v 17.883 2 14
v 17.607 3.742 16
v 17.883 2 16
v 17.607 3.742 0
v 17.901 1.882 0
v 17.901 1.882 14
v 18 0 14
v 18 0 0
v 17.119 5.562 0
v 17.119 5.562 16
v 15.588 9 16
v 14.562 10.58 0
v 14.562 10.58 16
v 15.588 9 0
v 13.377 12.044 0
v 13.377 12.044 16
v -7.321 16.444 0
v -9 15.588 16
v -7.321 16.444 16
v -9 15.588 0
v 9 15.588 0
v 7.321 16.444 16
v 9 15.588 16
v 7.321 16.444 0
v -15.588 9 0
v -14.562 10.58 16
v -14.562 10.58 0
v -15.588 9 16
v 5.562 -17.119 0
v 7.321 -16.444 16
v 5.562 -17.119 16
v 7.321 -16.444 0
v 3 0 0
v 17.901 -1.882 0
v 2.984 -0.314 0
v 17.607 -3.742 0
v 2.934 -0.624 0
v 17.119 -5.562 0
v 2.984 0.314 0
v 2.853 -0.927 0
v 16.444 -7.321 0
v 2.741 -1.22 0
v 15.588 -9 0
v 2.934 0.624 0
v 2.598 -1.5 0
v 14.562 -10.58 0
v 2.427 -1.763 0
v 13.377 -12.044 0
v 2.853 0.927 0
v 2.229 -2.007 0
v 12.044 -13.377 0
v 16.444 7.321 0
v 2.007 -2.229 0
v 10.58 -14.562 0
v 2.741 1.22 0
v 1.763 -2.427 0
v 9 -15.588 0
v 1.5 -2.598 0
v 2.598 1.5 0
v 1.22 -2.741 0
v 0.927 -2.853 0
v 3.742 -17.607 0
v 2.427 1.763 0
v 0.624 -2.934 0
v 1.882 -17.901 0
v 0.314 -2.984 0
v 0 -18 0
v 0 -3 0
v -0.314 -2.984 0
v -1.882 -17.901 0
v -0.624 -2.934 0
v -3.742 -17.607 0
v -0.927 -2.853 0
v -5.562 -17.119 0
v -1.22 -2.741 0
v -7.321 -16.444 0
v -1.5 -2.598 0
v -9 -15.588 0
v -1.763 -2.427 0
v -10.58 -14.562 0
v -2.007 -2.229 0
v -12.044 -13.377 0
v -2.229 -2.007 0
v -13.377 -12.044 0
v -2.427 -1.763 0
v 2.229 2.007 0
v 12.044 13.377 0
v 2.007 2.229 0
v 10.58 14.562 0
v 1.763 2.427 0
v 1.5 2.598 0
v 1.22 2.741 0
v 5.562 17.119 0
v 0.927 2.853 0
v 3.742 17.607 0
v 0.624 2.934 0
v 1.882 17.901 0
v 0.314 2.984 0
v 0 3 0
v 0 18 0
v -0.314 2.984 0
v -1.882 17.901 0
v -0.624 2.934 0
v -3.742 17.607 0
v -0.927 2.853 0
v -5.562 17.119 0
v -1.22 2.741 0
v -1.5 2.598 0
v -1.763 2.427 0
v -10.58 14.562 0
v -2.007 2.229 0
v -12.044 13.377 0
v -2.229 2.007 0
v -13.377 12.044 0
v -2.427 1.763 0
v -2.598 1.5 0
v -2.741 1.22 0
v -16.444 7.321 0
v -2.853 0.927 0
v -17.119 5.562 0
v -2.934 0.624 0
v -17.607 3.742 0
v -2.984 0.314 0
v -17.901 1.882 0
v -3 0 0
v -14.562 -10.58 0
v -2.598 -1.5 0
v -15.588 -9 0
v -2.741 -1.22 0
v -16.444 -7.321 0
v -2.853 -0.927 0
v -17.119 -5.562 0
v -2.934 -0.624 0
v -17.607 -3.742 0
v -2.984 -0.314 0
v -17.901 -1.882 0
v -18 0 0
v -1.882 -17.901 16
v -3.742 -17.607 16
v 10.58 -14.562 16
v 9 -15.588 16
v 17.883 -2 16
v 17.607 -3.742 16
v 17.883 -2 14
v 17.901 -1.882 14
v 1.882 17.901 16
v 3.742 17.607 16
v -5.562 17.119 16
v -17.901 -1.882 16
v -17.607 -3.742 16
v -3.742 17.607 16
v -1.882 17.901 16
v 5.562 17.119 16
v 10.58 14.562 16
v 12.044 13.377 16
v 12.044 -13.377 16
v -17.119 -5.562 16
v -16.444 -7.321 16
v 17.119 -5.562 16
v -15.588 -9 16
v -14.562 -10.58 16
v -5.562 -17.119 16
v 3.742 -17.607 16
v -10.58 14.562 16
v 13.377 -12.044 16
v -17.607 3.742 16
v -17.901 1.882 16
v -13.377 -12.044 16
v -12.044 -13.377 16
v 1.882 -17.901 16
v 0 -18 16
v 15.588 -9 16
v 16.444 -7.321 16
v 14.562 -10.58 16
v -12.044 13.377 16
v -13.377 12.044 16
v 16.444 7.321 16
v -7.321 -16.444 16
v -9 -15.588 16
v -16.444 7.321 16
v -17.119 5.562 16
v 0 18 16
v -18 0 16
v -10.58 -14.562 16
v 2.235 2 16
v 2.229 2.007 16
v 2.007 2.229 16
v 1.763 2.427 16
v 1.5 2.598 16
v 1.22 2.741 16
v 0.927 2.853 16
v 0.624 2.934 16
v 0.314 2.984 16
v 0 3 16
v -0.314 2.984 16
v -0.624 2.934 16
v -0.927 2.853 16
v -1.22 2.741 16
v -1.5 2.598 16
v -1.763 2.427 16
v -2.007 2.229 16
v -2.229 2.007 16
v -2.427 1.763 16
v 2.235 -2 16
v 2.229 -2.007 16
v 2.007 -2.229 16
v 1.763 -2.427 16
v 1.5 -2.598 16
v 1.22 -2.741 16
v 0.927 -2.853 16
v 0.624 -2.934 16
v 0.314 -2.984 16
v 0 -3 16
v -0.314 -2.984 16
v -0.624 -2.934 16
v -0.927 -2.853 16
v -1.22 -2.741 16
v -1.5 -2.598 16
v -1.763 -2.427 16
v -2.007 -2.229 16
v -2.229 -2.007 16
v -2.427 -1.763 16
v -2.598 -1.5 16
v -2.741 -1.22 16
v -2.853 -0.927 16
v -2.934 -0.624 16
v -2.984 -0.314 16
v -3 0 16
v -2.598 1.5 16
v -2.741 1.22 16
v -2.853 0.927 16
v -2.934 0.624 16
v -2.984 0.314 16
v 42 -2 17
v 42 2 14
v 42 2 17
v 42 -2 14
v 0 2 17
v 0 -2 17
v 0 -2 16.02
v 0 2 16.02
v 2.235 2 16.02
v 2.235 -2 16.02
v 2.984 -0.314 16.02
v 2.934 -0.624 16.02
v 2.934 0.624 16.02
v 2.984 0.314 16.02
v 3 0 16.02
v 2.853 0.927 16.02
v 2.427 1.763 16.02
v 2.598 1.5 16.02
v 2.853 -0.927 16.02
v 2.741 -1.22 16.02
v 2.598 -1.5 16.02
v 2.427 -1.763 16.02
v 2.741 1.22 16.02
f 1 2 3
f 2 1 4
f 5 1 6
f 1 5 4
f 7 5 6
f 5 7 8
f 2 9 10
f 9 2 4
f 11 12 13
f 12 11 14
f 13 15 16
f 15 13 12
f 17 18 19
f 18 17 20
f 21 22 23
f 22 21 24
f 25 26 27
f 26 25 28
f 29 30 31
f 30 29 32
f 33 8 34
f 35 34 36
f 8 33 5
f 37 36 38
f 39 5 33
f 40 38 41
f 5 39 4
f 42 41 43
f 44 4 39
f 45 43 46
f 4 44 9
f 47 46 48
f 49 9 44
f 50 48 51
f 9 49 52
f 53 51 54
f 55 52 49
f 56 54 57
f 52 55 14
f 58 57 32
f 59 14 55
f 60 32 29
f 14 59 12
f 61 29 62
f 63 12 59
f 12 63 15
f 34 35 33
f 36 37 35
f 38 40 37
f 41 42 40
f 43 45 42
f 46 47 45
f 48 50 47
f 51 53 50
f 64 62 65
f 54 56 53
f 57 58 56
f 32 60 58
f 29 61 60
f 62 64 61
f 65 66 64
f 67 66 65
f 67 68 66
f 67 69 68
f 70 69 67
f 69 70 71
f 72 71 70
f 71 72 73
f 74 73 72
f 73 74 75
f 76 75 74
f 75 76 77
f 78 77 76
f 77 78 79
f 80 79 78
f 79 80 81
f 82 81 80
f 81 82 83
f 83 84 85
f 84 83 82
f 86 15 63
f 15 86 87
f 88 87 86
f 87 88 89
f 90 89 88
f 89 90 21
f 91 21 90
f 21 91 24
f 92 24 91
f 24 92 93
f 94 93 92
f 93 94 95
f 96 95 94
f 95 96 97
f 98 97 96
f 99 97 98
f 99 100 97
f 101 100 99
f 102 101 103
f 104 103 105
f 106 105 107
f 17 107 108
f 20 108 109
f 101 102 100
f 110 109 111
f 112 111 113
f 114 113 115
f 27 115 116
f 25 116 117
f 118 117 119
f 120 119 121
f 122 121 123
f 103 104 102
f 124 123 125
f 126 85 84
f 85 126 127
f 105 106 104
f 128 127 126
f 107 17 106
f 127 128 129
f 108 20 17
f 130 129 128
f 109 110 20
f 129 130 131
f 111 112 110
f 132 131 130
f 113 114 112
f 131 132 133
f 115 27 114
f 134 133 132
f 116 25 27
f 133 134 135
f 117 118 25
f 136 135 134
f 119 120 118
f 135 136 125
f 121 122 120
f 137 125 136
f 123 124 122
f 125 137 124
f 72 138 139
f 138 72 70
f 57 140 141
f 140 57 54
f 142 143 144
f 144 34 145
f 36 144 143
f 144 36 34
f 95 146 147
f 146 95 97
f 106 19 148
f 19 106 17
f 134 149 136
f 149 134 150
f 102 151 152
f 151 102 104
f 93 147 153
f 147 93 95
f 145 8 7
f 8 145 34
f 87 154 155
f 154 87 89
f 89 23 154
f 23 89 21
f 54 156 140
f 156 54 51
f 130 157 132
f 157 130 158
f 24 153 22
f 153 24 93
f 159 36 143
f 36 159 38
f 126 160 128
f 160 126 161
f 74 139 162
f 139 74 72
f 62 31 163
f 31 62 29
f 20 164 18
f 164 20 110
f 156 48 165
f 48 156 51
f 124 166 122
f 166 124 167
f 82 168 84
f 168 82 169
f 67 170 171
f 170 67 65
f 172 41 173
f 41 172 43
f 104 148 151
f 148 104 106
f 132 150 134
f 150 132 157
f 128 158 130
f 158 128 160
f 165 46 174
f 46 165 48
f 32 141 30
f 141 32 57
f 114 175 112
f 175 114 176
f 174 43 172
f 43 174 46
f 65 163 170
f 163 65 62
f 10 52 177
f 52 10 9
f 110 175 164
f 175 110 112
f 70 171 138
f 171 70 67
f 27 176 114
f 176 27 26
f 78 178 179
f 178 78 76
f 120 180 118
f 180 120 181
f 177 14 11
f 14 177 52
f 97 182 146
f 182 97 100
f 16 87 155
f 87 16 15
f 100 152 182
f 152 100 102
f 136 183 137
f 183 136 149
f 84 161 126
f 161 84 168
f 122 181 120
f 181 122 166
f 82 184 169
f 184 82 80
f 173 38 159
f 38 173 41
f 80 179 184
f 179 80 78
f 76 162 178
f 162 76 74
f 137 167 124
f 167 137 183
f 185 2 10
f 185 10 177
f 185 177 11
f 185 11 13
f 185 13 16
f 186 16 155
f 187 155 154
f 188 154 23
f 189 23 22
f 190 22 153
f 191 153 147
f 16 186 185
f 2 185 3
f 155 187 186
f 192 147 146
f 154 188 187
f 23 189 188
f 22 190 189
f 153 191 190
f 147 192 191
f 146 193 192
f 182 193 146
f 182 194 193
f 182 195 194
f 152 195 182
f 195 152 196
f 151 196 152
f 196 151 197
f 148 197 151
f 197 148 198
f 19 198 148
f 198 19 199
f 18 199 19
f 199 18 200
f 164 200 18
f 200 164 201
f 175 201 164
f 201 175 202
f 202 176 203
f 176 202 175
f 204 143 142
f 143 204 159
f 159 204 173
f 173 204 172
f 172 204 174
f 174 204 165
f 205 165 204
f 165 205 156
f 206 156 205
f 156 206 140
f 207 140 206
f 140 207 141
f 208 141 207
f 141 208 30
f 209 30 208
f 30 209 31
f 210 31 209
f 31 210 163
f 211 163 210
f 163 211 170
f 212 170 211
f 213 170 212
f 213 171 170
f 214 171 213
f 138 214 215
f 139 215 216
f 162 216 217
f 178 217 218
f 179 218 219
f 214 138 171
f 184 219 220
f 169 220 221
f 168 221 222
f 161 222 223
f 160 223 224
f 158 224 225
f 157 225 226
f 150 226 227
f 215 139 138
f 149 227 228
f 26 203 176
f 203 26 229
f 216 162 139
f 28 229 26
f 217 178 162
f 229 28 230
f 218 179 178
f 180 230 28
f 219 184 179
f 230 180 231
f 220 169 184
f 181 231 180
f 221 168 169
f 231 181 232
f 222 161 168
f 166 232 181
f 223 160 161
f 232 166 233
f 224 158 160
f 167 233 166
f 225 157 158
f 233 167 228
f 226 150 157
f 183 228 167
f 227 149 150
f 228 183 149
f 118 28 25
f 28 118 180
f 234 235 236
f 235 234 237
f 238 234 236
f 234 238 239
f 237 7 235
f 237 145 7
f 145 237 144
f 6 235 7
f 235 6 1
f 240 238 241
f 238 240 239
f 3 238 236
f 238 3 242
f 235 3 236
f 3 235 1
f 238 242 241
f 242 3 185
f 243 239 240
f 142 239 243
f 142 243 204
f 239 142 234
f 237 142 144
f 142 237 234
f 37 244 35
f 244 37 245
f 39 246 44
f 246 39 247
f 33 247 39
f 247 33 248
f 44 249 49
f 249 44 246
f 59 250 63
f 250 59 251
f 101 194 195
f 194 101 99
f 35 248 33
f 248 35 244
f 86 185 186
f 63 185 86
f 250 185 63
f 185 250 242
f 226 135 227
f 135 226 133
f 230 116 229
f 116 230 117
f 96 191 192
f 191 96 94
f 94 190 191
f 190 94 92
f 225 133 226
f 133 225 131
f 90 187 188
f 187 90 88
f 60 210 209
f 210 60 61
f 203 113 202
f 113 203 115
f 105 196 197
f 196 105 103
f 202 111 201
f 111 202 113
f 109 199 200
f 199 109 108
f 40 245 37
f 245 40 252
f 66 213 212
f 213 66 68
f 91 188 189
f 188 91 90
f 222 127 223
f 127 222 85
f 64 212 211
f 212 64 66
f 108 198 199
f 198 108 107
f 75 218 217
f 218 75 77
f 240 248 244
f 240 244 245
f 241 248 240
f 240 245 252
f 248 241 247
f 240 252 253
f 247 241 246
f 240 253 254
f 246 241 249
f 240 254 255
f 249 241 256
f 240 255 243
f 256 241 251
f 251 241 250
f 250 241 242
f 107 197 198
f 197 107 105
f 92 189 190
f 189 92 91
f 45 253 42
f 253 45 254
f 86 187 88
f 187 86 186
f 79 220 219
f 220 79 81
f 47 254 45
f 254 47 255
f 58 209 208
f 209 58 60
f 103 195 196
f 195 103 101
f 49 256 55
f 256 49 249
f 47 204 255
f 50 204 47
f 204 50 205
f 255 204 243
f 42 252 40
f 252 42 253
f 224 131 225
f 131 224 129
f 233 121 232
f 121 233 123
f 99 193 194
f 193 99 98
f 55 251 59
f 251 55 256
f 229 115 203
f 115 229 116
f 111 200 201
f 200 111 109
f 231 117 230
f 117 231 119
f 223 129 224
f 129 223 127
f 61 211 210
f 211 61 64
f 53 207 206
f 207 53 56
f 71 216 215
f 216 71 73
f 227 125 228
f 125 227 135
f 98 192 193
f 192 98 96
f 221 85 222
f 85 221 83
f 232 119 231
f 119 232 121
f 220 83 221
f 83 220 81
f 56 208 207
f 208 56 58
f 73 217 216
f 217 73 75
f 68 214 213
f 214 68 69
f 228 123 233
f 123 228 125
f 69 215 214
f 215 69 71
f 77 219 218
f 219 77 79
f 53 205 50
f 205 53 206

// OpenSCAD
// Quarter-turn cam lock.
$fn = 60;
eps = 0.02;
body_d = 36;
body_l = 16;
arm_l = 42;
difference() { union() { cylinder(d=body_d,h=body_l); translate([0,-2,body_l-2]) cube([arm_l,4,3]); } translate([0,0,-eps]) cylinder(d=6,h=body_l+2*eps); }
